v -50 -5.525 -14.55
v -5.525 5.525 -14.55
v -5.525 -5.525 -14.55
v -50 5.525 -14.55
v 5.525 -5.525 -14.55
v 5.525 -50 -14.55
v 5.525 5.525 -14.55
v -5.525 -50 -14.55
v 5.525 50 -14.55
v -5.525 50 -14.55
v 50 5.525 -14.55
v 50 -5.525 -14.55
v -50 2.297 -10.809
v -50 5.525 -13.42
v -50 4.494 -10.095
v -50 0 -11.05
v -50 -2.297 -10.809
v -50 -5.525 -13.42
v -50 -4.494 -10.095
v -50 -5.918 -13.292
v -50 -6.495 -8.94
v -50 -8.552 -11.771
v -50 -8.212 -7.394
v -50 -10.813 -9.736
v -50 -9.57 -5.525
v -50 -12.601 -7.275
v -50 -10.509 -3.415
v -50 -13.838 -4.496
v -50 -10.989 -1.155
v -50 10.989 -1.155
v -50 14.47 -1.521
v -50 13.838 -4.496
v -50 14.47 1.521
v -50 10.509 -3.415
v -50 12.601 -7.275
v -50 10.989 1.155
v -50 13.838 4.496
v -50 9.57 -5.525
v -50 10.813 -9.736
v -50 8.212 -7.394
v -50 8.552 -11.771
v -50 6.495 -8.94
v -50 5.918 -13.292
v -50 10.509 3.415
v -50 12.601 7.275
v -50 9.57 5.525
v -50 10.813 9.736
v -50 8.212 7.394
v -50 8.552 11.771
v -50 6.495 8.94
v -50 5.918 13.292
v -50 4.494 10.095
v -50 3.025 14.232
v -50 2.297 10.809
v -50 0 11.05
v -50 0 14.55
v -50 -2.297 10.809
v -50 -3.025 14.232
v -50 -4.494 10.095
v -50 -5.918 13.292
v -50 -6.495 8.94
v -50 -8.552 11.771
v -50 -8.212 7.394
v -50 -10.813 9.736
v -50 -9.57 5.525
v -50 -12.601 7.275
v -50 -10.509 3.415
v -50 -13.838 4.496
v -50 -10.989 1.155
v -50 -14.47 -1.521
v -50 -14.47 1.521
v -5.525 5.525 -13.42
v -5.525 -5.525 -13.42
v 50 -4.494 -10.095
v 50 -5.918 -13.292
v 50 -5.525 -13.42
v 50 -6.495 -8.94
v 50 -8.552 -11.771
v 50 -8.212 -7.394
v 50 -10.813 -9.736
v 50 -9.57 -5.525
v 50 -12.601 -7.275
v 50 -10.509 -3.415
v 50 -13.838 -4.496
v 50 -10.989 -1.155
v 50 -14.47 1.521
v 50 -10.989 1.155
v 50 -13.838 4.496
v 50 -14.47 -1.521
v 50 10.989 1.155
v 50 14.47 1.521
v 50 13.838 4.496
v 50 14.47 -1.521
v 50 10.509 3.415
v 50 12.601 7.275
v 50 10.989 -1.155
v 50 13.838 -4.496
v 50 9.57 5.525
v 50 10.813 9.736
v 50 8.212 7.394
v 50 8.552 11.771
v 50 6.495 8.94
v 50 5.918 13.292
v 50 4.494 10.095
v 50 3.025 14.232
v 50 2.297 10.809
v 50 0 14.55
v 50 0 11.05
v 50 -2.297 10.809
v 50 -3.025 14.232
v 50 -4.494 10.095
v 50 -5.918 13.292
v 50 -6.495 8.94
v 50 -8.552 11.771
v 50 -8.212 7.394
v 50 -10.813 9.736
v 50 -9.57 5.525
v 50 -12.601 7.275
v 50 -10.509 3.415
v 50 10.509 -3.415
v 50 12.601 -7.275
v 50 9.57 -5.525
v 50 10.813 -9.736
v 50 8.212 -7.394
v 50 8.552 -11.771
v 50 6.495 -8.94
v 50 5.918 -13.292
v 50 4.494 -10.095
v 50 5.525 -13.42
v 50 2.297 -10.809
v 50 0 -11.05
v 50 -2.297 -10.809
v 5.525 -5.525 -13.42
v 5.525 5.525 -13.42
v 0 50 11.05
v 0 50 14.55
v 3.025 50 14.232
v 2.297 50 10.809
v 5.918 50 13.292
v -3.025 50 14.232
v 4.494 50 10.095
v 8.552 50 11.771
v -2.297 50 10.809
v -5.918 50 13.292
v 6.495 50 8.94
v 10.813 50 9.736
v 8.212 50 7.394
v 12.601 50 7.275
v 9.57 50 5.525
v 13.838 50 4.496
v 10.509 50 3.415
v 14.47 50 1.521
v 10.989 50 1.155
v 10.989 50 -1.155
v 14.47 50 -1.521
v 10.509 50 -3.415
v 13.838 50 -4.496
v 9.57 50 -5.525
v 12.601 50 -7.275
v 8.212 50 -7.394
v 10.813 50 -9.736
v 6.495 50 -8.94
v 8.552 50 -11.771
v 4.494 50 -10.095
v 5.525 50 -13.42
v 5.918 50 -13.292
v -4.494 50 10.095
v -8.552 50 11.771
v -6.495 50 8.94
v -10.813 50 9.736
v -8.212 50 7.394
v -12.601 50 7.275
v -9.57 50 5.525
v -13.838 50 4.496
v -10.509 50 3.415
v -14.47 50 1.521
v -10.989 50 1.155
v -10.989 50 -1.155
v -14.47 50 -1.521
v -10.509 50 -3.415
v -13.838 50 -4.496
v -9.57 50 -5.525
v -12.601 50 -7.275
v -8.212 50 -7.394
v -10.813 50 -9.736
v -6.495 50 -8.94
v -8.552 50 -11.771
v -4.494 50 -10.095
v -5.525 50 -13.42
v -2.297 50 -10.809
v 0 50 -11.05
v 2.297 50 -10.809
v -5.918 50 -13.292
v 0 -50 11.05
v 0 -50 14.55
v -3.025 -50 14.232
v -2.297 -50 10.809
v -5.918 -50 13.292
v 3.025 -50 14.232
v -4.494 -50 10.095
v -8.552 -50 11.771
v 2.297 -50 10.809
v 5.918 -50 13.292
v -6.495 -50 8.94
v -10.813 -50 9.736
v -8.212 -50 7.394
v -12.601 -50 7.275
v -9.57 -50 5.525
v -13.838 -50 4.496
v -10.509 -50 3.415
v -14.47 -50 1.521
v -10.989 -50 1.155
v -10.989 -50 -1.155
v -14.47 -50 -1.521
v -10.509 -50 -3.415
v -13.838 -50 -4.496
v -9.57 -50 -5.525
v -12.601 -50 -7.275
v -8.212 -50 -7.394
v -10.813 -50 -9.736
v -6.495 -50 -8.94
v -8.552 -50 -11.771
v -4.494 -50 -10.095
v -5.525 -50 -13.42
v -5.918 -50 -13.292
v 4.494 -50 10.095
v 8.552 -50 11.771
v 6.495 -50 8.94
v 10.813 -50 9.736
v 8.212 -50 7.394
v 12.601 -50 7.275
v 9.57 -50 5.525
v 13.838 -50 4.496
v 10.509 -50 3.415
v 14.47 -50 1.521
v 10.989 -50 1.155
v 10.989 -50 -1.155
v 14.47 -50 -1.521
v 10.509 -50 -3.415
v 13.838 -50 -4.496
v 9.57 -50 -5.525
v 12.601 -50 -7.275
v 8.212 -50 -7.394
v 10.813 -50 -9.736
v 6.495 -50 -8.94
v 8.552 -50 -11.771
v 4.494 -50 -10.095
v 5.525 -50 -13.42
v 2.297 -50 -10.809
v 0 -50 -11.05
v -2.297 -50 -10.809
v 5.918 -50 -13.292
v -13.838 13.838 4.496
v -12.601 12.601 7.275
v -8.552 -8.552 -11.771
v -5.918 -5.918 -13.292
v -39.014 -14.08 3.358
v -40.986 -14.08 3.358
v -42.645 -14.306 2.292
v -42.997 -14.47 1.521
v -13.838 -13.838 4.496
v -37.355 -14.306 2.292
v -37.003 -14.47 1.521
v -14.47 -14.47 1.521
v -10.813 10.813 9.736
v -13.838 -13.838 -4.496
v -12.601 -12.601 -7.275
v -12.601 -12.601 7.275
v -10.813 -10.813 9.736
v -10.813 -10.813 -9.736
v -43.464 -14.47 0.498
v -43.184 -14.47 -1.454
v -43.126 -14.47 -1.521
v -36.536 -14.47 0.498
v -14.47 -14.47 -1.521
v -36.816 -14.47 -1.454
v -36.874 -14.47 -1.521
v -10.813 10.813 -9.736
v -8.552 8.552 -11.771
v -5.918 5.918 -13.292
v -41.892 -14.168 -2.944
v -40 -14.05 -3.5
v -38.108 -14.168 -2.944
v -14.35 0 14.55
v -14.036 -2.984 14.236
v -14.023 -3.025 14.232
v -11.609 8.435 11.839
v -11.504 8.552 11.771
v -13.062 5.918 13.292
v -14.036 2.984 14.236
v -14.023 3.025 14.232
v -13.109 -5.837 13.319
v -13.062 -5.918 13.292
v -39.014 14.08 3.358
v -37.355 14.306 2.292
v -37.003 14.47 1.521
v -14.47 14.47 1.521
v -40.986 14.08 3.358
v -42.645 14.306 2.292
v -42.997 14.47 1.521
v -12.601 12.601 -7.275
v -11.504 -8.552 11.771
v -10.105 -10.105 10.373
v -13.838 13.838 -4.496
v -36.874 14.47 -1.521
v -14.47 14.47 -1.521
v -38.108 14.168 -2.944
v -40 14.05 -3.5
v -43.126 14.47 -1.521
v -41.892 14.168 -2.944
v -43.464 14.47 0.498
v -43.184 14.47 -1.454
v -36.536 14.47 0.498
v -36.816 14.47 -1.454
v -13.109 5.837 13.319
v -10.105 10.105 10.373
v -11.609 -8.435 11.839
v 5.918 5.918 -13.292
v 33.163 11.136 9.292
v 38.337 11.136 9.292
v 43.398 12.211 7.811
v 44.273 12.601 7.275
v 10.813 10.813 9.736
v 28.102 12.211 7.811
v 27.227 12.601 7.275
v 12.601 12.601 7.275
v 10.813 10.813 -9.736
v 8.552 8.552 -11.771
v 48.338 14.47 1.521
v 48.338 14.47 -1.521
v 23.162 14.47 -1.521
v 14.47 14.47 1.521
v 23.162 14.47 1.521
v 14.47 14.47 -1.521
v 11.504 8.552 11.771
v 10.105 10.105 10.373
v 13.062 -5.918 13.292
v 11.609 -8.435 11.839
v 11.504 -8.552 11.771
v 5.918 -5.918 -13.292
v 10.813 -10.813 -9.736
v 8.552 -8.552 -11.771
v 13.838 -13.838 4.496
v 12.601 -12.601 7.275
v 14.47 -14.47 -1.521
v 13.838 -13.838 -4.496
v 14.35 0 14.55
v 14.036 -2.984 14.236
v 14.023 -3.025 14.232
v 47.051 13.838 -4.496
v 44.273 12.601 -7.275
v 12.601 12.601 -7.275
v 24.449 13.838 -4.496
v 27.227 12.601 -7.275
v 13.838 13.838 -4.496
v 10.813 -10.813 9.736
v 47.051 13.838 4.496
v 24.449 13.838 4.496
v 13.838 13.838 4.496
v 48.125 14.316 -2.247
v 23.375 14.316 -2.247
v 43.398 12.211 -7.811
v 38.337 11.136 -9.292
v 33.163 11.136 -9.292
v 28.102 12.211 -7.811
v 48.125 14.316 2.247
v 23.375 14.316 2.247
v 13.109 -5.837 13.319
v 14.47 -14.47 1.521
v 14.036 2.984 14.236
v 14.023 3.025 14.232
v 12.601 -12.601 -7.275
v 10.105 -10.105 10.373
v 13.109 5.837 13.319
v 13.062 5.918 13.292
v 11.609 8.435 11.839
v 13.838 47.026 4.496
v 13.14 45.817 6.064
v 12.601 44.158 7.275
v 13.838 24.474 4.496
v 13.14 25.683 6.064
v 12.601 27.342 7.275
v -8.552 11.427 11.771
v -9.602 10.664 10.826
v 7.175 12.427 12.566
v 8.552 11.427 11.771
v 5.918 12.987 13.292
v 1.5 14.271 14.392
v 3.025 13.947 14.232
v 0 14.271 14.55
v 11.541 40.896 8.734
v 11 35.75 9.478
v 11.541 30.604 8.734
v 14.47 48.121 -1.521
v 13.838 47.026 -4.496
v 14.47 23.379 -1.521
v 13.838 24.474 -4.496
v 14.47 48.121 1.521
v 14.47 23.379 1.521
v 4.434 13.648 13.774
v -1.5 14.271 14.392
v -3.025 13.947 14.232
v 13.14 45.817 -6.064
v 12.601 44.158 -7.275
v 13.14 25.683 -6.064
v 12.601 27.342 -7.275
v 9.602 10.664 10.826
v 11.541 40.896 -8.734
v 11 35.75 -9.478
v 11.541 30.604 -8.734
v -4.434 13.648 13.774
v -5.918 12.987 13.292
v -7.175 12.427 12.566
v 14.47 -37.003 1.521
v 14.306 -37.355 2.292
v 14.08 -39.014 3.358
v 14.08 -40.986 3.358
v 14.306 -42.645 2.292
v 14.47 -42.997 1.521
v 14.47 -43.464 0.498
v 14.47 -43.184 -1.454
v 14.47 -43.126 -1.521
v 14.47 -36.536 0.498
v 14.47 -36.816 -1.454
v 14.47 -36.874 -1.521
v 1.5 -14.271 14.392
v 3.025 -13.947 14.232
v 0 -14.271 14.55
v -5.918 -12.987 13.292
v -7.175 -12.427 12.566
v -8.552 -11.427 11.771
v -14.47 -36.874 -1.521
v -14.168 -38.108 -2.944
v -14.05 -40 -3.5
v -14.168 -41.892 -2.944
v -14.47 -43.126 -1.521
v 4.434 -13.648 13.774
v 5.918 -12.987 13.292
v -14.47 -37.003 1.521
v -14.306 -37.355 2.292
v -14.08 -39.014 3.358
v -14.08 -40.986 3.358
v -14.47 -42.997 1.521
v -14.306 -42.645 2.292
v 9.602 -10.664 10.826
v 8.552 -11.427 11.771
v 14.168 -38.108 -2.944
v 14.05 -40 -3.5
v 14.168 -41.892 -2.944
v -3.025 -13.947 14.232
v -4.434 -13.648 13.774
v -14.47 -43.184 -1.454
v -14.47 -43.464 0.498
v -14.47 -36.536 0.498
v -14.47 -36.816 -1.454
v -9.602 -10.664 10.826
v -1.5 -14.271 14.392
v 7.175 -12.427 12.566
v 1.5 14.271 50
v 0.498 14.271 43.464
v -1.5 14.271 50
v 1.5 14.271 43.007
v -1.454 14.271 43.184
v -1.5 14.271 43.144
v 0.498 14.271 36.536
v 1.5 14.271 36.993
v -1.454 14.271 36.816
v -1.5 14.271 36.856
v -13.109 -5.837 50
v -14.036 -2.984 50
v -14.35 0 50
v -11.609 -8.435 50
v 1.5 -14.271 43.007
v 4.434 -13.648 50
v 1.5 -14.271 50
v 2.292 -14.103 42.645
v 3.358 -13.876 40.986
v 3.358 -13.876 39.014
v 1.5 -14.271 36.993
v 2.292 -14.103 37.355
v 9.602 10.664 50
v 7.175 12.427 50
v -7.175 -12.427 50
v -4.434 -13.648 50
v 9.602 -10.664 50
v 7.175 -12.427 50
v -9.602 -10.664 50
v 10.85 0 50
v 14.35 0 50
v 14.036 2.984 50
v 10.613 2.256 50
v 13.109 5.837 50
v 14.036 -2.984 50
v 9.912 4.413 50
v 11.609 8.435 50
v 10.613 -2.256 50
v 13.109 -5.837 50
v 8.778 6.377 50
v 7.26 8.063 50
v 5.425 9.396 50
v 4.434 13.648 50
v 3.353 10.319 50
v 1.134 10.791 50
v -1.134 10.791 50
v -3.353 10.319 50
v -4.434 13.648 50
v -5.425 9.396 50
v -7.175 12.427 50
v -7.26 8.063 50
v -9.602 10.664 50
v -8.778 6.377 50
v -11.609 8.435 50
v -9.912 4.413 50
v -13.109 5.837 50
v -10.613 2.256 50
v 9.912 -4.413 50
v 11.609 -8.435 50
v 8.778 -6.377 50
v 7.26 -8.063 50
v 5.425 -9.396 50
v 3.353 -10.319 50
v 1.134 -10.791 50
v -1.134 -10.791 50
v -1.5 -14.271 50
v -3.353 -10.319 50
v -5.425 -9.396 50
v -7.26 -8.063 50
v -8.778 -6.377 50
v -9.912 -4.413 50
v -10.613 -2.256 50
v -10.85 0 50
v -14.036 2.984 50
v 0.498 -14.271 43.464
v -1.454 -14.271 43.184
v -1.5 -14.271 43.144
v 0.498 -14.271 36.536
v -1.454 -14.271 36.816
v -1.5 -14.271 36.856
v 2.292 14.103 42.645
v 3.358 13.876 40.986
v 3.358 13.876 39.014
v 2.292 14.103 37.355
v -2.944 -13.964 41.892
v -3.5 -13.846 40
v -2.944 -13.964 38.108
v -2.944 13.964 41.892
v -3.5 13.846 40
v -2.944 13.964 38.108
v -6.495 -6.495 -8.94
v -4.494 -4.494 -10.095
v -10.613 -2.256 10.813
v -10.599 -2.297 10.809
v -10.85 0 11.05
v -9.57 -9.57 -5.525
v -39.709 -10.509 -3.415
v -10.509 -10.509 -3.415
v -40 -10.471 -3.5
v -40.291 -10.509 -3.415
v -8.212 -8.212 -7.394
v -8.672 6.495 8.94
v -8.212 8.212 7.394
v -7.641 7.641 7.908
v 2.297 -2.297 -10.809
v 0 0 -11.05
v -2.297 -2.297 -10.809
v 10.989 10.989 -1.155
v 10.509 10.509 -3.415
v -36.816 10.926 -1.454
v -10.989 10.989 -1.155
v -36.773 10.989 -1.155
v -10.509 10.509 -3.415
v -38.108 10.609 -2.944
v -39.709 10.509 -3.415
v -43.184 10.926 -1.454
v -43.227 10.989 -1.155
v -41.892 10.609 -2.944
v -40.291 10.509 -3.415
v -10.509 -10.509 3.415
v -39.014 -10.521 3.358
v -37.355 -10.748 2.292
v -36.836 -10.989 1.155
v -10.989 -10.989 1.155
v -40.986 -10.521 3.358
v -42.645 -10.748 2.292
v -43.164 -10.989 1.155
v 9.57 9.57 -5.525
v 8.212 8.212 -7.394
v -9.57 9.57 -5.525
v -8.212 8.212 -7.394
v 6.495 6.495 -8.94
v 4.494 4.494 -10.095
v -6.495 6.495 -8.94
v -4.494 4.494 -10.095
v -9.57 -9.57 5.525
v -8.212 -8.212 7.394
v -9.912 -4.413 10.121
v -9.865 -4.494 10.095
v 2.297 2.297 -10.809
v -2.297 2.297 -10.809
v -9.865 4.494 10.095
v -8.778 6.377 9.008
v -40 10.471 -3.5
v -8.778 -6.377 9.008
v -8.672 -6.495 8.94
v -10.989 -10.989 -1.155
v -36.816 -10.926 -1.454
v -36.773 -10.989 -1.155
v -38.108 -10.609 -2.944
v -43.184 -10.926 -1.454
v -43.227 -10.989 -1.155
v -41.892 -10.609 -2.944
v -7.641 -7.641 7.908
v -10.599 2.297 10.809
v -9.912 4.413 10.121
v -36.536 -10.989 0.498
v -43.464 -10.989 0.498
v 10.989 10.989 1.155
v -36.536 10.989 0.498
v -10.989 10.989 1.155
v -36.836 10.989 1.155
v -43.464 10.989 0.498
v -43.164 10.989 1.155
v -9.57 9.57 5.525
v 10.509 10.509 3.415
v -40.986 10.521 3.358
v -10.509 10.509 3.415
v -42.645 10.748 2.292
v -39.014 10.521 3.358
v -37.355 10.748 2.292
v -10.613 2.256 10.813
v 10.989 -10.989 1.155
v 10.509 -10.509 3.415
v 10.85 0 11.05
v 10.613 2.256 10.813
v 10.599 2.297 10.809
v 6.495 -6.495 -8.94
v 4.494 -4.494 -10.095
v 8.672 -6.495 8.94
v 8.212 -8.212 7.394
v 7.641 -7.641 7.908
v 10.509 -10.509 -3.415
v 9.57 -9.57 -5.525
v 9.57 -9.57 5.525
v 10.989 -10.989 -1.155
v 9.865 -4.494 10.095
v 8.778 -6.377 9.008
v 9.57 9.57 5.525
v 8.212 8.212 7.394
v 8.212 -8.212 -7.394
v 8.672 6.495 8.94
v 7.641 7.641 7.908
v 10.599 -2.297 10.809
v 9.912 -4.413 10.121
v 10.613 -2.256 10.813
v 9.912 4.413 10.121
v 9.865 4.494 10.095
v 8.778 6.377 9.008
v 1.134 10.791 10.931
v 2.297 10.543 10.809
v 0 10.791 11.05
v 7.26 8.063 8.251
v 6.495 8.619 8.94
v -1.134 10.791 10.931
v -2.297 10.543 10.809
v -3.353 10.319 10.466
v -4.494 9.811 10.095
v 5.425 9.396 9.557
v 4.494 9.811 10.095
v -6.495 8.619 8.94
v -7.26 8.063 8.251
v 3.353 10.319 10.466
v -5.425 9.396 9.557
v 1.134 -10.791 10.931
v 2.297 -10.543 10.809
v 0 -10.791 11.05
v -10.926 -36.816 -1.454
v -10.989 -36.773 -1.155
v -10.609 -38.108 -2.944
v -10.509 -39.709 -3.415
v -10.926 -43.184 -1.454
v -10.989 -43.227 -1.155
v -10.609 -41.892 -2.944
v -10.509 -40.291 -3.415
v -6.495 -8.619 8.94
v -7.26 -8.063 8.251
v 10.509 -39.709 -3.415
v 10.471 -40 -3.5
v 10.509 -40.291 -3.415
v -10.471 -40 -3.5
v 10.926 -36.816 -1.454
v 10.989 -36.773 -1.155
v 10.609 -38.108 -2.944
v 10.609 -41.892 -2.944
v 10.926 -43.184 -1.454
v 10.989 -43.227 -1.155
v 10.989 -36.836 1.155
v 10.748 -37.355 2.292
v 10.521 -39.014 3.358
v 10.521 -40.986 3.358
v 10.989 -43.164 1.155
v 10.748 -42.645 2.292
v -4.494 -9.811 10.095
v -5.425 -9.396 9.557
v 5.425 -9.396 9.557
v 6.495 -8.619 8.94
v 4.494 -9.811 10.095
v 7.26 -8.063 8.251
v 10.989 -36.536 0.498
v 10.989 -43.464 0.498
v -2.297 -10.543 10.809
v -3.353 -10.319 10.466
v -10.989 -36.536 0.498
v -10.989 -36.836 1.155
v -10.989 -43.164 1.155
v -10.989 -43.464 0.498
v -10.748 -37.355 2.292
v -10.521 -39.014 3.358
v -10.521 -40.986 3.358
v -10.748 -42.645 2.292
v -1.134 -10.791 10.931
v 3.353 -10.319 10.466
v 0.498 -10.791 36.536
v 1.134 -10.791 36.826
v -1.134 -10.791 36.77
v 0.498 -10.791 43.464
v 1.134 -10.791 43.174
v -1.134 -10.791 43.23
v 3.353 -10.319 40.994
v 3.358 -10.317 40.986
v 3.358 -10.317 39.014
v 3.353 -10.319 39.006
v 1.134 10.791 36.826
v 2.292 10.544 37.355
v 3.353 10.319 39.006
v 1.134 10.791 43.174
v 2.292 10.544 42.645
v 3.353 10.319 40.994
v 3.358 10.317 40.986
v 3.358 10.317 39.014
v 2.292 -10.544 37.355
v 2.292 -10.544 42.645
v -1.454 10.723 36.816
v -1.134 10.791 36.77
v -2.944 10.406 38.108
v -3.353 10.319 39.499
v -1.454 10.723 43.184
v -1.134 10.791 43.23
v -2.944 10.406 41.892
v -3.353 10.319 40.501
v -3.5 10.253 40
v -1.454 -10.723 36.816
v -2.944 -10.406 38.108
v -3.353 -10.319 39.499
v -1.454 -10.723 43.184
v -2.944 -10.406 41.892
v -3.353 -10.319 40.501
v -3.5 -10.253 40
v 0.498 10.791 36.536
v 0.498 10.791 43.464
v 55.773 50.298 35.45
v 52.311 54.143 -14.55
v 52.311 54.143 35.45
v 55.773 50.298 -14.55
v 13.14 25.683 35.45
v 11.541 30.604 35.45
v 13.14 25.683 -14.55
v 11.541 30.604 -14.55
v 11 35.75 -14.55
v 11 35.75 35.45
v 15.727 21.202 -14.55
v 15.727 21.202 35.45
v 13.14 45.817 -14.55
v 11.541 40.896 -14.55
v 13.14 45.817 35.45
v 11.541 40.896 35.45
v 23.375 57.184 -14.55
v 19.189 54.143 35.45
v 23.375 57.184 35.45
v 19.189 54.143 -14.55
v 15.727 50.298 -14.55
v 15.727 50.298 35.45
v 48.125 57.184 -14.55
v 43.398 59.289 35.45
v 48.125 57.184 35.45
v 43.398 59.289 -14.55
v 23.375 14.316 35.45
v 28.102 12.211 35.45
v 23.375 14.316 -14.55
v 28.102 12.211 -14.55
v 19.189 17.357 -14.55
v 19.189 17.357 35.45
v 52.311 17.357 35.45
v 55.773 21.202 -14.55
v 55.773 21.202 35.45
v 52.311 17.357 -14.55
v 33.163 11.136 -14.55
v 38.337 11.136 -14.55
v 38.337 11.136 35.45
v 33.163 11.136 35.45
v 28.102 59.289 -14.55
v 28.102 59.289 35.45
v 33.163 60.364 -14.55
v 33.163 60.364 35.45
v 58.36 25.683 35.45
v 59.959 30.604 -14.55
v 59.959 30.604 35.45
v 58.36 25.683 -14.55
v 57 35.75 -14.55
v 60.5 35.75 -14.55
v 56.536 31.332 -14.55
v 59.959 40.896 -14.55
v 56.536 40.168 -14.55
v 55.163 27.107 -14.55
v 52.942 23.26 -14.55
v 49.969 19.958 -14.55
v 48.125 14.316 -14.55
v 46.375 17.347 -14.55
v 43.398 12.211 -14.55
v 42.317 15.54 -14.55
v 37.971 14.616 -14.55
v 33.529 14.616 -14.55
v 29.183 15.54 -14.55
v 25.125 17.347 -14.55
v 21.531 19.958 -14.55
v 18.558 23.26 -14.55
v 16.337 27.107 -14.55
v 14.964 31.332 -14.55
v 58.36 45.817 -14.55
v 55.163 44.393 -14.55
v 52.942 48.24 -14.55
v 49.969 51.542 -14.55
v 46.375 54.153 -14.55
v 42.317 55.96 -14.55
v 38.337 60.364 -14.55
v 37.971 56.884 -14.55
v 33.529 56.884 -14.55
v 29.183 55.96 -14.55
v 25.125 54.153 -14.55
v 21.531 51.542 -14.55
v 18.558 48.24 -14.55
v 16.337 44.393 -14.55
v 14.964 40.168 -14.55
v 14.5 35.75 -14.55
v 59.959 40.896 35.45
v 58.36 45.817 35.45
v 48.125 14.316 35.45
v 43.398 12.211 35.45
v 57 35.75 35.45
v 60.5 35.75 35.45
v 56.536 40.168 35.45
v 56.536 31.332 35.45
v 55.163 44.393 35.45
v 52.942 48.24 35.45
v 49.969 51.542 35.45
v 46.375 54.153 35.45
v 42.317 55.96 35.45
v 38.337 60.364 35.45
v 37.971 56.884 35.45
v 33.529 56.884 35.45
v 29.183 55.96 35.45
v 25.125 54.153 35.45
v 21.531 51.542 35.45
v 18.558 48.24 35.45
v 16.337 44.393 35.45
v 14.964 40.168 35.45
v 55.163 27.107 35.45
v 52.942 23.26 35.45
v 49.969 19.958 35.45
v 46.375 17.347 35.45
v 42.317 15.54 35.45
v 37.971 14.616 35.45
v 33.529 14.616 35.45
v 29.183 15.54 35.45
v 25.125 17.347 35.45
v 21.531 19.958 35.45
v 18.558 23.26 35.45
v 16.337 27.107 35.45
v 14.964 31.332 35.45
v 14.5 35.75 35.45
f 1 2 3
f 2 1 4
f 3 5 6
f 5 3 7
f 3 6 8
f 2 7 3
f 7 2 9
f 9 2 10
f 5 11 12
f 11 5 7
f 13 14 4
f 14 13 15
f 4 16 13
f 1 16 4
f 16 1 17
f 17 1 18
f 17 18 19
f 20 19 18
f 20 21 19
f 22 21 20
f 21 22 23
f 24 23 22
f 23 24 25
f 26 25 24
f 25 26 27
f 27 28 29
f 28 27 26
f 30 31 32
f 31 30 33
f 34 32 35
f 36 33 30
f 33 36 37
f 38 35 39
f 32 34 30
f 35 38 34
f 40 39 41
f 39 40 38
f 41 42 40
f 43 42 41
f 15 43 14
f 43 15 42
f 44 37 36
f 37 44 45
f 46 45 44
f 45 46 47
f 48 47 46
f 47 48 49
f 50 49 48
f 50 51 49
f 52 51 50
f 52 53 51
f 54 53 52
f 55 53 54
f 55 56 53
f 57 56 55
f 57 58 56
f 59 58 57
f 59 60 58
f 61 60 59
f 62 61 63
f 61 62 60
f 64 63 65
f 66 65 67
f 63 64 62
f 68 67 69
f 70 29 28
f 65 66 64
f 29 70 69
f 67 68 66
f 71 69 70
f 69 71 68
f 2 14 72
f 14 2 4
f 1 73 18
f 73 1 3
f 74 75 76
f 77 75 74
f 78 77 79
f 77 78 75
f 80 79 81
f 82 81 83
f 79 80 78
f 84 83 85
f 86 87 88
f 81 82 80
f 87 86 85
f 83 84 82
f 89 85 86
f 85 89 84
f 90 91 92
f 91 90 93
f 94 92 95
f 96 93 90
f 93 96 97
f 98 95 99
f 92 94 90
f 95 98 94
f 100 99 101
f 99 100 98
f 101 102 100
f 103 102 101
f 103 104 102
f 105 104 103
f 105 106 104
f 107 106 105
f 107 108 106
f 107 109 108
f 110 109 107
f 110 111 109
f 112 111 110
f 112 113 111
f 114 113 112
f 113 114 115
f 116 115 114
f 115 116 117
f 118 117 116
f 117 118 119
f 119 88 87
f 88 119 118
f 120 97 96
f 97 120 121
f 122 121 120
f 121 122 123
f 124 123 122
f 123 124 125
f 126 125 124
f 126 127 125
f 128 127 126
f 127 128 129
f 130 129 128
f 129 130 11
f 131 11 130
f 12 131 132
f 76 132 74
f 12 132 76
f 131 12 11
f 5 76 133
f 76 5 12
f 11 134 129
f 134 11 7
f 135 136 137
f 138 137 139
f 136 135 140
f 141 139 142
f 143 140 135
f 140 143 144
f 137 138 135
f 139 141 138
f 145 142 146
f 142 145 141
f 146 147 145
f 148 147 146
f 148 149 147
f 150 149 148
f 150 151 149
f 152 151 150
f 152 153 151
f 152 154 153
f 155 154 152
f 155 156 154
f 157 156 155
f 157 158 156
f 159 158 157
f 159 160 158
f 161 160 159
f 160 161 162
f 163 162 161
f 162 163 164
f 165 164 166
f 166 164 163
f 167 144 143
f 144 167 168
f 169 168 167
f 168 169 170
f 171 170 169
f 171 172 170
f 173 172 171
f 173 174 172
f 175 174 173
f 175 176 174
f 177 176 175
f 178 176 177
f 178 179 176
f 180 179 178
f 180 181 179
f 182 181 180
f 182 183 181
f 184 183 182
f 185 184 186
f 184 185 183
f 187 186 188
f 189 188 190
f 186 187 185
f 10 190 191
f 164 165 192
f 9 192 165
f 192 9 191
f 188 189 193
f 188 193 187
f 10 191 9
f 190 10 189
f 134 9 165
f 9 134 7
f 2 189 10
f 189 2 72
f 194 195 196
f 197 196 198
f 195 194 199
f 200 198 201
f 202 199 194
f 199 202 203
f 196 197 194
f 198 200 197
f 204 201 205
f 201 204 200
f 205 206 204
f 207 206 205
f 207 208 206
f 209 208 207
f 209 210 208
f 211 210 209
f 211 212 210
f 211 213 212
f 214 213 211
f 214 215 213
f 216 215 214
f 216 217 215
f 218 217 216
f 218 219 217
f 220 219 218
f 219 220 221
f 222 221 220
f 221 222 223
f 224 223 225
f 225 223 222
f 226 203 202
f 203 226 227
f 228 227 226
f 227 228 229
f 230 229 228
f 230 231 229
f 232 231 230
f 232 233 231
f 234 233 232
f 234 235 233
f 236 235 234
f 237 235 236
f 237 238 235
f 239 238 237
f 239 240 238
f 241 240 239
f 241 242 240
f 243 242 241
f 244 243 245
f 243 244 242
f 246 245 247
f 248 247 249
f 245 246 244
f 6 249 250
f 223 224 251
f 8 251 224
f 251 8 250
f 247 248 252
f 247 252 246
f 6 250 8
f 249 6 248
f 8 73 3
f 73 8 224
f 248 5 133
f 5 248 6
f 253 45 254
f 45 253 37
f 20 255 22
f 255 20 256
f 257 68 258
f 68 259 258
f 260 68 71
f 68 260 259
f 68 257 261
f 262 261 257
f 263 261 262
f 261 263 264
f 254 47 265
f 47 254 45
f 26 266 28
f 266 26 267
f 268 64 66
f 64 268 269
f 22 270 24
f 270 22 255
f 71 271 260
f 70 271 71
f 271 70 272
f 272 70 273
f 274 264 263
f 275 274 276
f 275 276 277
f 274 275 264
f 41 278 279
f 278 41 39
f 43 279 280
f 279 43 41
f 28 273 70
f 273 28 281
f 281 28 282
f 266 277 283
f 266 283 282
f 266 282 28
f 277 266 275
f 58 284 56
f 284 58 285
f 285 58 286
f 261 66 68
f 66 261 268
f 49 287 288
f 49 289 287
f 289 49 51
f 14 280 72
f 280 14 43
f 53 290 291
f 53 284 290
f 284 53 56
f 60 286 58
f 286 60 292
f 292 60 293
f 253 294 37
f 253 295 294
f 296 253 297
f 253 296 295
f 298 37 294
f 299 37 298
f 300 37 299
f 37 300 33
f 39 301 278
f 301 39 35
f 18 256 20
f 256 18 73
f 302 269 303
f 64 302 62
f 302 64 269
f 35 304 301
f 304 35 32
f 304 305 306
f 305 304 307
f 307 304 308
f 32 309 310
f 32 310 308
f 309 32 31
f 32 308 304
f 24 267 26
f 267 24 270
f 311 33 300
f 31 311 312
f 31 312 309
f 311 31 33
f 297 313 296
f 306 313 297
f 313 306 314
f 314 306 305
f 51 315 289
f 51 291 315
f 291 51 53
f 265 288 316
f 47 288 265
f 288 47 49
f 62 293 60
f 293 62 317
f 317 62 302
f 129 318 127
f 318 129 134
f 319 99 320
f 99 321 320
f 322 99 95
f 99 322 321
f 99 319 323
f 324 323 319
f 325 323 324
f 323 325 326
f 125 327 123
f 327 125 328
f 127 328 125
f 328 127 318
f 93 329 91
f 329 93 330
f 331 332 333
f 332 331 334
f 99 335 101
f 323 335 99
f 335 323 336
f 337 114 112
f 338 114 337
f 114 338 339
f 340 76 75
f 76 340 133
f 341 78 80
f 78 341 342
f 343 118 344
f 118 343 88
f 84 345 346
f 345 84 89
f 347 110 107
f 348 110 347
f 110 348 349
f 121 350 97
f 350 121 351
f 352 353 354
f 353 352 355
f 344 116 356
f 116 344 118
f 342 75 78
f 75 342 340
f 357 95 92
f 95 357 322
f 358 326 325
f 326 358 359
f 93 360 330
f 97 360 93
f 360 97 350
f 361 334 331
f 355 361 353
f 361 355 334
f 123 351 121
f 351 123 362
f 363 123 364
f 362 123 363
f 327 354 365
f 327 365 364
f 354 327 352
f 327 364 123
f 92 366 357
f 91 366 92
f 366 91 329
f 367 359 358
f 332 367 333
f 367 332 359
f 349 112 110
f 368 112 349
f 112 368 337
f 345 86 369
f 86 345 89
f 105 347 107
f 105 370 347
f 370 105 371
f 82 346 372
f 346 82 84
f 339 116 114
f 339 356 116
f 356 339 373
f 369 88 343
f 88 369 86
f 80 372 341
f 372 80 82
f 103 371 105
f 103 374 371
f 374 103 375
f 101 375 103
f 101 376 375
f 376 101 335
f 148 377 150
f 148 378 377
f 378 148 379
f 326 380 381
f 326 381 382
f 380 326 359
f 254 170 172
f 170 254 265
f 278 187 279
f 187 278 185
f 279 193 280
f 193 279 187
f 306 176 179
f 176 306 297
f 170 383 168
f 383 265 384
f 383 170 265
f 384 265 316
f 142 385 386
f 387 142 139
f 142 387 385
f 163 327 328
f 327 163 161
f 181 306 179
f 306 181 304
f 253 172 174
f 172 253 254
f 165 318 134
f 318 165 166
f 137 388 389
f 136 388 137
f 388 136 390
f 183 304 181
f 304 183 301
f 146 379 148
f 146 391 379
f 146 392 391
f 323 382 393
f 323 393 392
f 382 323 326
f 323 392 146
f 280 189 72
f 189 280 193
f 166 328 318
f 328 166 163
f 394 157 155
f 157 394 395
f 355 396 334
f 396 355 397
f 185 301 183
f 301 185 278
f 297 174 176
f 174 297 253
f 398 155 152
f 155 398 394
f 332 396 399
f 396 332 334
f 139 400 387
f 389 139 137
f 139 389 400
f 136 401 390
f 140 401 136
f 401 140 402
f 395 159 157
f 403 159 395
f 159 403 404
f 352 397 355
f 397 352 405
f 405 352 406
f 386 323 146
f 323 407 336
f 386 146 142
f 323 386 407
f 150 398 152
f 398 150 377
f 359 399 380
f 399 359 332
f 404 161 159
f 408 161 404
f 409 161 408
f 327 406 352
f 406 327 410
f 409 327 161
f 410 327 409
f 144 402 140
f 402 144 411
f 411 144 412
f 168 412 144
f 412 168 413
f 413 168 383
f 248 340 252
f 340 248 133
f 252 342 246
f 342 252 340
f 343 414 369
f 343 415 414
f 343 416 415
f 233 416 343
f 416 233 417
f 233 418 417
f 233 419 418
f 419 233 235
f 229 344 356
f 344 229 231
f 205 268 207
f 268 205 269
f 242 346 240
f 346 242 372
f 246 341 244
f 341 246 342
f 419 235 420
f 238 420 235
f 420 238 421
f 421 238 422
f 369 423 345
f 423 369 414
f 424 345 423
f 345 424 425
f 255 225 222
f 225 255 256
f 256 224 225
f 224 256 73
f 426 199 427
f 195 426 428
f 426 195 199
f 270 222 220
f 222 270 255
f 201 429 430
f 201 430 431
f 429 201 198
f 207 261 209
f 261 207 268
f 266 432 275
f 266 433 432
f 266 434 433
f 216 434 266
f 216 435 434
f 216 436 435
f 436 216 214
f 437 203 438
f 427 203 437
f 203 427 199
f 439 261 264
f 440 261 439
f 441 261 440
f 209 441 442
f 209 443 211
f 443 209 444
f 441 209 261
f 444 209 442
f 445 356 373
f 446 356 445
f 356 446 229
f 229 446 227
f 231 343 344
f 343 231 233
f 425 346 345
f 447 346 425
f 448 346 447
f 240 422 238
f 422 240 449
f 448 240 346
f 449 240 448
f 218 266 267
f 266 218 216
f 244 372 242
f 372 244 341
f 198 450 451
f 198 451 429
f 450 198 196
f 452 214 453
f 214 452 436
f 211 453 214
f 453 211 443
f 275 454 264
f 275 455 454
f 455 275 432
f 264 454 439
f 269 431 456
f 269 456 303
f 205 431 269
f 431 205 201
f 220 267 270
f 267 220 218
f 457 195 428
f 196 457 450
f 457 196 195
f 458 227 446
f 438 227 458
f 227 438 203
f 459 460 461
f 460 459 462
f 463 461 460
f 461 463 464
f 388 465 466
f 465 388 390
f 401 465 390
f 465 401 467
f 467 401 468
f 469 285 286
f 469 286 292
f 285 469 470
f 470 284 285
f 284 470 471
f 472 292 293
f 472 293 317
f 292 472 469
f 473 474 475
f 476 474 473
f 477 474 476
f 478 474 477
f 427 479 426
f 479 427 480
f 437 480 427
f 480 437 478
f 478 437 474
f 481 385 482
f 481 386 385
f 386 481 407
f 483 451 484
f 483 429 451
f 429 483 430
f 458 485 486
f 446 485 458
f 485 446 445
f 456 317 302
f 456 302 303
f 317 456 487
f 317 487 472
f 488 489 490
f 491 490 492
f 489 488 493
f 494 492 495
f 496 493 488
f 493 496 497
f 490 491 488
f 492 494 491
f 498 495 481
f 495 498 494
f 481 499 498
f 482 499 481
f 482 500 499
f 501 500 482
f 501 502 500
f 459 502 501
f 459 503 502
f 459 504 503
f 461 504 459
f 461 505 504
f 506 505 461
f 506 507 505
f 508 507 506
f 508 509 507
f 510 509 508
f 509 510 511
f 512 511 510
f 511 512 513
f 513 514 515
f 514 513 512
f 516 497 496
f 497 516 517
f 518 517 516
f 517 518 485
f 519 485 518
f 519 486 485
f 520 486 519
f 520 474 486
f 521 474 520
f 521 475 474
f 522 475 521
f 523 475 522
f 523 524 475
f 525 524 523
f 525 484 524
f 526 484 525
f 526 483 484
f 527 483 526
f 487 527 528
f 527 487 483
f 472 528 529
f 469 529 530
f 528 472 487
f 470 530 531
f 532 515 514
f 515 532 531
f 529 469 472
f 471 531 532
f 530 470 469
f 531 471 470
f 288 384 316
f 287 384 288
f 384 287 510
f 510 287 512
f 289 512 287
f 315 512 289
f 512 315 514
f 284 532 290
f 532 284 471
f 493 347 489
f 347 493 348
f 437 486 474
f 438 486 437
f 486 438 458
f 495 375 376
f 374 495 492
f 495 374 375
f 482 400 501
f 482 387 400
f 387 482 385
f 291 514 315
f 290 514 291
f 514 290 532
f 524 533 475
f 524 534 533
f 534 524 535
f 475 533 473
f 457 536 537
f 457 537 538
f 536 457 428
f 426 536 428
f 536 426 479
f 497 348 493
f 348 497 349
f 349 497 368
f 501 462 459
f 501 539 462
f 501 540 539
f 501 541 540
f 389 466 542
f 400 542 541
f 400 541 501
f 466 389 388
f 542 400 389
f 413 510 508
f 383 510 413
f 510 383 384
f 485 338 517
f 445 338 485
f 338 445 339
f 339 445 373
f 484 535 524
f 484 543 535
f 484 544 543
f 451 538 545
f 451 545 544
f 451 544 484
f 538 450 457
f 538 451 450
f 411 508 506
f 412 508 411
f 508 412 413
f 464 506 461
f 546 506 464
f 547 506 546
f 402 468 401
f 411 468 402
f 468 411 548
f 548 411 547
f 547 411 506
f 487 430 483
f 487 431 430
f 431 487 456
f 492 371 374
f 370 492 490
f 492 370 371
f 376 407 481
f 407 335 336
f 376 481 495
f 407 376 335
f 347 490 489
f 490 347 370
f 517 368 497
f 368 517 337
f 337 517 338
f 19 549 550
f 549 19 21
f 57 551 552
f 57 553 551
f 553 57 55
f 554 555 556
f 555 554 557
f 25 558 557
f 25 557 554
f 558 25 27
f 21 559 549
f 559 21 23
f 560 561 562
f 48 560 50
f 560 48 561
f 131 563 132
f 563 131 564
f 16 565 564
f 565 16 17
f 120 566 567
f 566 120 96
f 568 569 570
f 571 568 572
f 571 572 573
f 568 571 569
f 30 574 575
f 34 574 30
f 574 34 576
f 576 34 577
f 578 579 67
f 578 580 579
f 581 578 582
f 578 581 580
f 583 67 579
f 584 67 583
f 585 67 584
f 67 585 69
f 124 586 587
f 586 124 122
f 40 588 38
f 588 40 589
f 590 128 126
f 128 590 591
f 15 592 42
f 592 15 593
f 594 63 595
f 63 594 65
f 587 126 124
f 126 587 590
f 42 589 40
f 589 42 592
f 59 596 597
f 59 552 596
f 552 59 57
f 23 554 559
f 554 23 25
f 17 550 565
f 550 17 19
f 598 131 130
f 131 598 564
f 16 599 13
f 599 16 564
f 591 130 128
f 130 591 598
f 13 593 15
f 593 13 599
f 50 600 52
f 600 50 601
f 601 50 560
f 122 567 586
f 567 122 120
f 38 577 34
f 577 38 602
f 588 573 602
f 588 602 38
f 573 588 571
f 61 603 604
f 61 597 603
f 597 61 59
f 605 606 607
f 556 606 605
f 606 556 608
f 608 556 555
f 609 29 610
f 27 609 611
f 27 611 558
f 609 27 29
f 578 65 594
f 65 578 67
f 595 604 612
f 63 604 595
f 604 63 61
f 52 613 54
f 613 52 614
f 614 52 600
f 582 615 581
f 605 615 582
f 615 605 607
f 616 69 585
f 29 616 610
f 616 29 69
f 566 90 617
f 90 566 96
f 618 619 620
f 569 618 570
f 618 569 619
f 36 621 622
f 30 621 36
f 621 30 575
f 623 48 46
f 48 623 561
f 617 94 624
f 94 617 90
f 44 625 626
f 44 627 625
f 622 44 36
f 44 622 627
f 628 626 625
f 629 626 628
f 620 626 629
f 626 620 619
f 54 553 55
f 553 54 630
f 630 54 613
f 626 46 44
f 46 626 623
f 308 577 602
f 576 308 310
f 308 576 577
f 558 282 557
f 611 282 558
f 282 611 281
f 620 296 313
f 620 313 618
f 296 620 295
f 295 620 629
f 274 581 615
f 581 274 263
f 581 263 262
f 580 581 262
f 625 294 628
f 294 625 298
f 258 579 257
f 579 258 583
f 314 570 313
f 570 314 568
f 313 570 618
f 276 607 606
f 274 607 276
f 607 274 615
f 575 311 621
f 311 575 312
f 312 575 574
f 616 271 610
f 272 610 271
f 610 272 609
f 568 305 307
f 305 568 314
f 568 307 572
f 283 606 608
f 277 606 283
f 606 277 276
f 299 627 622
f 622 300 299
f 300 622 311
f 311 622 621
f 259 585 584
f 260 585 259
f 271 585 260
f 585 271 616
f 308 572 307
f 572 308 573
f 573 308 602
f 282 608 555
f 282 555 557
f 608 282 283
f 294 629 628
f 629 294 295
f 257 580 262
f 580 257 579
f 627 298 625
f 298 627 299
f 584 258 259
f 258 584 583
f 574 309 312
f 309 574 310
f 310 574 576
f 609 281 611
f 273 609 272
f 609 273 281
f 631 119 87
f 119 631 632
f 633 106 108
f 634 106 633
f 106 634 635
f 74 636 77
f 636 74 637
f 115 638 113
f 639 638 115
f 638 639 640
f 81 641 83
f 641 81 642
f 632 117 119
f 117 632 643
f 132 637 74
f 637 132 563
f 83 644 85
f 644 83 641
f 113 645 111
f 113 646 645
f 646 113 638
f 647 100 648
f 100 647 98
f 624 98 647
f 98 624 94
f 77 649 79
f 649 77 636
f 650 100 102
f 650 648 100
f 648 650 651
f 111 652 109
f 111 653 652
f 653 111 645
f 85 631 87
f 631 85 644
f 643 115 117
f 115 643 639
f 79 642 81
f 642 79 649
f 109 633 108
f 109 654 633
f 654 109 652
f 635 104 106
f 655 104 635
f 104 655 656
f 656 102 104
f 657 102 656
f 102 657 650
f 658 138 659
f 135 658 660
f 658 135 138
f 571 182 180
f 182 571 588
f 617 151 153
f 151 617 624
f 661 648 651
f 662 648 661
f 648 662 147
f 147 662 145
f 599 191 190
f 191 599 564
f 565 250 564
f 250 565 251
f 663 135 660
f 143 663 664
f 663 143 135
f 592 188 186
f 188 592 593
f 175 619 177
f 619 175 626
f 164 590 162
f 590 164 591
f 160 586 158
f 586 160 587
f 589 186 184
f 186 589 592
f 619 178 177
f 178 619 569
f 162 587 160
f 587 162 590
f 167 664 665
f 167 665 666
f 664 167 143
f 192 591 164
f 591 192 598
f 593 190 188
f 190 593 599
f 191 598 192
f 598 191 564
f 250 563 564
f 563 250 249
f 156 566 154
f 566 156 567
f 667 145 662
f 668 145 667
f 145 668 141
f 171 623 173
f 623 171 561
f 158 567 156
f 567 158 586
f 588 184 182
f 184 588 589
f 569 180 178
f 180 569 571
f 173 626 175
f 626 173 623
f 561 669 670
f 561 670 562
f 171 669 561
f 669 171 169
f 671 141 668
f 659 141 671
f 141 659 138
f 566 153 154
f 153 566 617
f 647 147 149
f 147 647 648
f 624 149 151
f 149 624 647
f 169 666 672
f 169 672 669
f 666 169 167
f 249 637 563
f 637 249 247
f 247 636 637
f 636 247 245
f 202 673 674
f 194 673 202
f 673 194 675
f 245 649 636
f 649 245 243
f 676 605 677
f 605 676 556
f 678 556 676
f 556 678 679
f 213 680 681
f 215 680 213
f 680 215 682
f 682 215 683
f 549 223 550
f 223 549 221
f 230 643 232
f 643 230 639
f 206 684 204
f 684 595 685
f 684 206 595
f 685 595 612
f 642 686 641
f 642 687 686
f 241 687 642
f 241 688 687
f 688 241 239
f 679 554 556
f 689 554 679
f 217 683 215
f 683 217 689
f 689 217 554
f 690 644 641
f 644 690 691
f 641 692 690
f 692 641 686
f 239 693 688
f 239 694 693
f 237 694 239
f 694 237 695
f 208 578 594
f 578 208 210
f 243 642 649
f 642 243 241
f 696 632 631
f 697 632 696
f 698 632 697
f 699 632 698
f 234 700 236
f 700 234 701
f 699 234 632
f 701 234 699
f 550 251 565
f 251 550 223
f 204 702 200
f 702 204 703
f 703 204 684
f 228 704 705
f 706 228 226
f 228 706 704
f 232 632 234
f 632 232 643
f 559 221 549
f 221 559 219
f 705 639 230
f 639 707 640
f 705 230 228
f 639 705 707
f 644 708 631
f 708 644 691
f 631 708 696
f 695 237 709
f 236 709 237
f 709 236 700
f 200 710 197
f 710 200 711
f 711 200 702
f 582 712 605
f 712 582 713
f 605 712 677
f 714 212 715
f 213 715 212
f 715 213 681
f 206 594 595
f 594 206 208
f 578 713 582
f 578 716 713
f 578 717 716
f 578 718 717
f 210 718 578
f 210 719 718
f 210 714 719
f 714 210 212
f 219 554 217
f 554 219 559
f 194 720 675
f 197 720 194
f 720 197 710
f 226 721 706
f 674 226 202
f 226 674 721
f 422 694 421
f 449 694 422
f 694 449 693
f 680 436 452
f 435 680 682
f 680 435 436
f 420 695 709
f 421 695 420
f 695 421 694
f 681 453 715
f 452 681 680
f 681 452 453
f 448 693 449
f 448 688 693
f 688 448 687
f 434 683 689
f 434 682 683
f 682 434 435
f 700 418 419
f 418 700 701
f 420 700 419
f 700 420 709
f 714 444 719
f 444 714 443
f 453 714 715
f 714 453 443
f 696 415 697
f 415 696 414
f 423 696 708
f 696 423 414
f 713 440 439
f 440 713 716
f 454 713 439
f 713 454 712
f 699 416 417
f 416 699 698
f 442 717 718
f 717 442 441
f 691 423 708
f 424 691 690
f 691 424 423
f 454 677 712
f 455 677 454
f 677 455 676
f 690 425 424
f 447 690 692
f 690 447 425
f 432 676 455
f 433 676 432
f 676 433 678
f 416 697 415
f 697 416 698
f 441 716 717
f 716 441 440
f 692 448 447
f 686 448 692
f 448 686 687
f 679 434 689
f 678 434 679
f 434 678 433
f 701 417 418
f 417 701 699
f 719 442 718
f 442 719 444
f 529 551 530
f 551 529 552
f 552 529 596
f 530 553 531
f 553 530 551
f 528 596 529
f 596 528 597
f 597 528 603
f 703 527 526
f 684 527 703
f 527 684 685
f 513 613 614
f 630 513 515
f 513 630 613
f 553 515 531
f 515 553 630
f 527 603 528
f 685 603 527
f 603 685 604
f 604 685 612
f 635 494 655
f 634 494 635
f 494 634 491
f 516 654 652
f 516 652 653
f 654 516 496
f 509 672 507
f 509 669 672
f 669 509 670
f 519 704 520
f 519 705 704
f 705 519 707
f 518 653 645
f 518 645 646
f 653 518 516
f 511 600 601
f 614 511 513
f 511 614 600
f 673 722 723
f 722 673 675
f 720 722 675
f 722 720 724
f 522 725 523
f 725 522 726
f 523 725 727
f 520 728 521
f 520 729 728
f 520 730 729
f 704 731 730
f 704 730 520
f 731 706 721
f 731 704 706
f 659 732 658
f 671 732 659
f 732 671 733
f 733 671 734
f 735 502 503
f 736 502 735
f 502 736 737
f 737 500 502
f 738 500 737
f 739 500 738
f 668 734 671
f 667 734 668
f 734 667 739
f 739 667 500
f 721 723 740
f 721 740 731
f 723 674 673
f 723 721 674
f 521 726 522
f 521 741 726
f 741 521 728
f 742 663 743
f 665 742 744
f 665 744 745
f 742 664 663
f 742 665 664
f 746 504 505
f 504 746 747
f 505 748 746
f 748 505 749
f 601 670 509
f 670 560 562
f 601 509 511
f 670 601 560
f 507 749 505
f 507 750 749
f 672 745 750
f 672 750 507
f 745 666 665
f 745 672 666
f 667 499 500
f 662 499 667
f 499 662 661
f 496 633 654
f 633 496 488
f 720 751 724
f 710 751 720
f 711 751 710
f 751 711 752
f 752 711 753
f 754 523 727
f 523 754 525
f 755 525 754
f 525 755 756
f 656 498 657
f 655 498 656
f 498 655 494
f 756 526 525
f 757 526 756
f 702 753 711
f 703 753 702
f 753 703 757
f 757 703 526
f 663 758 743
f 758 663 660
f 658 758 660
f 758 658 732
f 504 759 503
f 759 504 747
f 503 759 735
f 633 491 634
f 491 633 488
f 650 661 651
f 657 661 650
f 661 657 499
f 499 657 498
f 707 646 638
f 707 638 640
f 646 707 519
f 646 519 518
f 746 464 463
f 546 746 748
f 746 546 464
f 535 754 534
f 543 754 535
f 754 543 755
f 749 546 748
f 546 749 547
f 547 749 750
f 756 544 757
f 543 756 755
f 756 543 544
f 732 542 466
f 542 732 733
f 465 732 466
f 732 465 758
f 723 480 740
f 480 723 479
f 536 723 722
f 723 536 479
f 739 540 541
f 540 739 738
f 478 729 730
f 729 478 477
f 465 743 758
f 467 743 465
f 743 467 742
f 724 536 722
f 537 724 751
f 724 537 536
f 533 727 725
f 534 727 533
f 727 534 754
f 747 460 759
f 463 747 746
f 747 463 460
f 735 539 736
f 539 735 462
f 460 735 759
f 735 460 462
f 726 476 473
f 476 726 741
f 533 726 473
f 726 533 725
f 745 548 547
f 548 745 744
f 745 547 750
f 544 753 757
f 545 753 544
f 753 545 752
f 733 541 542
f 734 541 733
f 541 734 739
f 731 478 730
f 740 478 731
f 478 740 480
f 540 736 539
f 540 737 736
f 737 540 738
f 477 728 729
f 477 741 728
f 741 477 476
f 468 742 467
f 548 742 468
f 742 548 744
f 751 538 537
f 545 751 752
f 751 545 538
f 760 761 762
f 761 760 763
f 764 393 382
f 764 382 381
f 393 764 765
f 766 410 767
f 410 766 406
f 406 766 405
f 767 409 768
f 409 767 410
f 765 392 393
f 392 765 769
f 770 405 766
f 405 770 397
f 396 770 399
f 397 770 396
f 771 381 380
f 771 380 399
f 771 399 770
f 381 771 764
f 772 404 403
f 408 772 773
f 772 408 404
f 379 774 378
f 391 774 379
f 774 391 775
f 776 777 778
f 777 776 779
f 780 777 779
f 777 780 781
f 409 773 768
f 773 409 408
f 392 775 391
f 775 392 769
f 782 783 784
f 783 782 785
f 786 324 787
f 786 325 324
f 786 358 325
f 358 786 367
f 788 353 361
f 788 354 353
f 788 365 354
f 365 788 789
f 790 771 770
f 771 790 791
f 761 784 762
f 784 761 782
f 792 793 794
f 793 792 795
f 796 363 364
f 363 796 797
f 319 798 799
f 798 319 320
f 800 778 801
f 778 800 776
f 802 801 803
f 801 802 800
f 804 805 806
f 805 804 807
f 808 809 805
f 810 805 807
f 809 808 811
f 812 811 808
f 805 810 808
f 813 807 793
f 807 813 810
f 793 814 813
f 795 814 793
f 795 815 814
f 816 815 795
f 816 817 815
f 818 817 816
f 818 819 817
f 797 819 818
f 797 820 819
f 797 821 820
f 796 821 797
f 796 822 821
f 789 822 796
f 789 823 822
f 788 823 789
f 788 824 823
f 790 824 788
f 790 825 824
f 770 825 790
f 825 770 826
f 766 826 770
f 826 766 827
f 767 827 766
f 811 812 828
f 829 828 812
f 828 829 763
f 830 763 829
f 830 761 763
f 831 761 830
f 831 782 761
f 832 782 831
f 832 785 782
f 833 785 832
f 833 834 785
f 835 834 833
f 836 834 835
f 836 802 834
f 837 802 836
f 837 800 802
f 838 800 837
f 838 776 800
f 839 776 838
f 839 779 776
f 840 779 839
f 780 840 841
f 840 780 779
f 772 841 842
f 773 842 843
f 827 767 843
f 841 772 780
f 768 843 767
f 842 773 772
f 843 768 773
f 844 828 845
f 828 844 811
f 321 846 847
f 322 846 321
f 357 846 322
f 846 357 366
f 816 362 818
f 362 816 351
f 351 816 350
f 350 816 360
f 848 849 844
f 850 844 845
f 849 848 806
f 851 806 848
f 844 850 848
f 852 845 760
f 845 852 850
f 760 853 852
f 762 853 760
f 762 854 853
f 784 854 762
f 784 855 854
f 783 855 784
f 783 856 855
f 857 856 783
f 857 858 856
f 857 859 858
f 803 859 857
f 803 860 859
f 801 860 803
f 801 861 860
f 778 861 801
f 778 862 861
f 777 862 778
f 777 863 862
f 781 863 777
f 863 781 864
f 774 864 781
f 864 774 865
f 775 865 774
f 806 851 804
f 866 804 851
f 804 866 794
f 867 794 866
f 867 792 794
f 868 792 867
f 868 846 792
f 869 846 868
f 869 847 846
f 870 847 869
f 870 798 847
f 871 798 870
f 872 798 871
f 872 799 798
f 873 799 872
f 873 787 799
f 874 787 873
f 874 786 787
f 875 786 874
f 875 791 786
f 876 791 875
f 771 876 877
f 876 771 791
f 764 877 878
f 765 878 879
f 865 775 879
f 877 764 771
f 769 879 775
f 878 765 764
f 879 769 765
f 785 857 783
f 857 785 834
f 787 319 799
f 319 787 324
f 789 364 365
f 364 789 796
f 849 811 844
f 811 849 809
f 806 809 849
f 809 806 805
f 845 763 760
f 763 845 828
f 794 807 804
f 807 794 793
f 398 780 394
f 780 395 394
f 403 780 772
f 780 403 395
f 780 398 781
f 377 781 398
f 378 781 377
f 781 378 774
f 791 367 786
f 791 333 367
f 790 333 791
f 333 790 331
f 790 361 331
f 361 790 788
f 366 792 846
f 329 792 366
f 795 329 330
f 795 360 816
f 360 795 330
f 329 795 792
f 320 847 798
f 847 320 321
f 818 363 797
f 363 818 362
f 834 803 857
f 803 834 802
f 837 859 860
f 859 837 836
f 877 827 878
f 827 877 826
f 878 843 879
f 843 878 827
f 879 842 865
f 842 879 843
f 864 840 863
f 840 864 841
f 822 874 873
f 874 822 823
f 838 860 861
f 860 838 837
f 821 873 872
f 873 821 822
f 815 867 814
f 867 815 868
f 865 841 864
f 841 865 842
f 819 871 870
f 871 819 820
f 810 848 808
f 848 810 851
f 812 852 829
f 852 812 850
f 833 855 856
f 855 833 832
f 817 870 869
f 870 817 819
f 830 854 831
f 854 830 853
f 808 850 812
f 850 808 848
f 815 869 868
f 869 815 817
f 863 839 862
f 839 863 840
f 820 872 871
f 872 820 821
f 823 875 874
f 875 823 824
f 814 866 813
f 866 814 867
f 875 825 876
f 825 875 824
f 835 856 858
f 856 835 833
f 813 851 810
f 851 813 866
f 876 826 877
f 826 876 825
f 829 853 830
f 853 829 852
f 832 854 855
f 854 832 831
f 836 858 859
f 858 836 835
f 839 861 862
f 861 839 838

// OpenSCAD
// file: jointModule.scad
// Modules
// legs is a vector of legs,
// each leg is a vector containing:
// vector of the joint rotation
// horizontalPipeInsideDiameter
// Optional Boolean requesting addition of a flat bottom
// Optional Boolean or number requesting a hole drilled near the end,
//      If it is a number, this is the angle at which it should be drilled.
//      For historical reasons, 0 and true are equivalent
//      Use false when you need to skip this but still add another vector entry
// i.e. [[x, y, z], horizontalPipeInsideDiameter]

/*
i.e.
jointLegs = [
        [[0, 90, 0], horizontalPipeInsideDiameter, true, true],
        [[90, 90, 0], horizontalPipeInsideDiameter, true, 45],
        [[90, 90, 180], horizontalPipeInsideDiameter, true, 90],
    ];

 */
module joint(legs, sphereJointInsideDiameter, closeUpWithSphere)
{
    difference()
        {
            // Build
            union() color(JointColor)
                {
                    for (leg = legs) {
                        rotate(leg[0]) cylinder(
                        h = jointLegLength,
                        r = (leg[1] + jointWallThickness * 2) / 2);
                        // Add flat bottom
                        if (leg[2]) {
                            rotate(leg[0])
                                translate([
                                        (leg[1] / 2) + (jointWallThickness / 2),
                                    0,
                                        jointLegLength / 2
                                    ])
                                    cube([
                                        jointWallThickness,
                                        // The 0.4 is a guess at width. A parameter would probably be better.
                                            leg[1] * 0.5,
                                        jointLegLength
                                        ],
                                    center = true);
                            // Add a cylinder at the end of the leg to close any gap between leg flats
                            // This also creates a solid floor in case the sphere is so big
                            // that the cut below cuts off the bottom of it.
                            rotate(leg[0])
                                rotate([0, 90, 0])
                                    translate([
                                        0,
                                        0,
                                            leg[1] / 2,
                                        ])
                                        cylinder(h = jointWallThickness, r = (leg[1] * 0.5) / 2);
                        }
                    }

                    if (closeUpWithSphere)
                    // Use a Sphere to close up the gap between the pipes.
                    // This is kinda hacky, but it looks good to me and does the job.
                        sphere(d = sphereJointInsideDiameter + jointWallThickness * 2);

                }

            // Hollow out
            union()
                {
                    for (leg = legs) {
                        // The -0.01 ensures that the end of the tube is clear.
                        rotate(leg[0]) translate([0, 0, - 0.01]) cylinder(
                        h = jointLegLength + 0.02, r = leg[1] / 2);

                        // IF a flat bottom was added, also add a "cut" to ensure nothing
                        // else in the part extends below this flat bottom.
                        if (leg[2]) {
                            rotate(leg[0])
                                translate([
                                        (leg[1] / 2) + (jointWallThickness * 2),
                                    0,
                                        jointLegLength / 2
                                    ])
                                    cube([
                                        // The 0.00001 just ensures it doesn't clip the flat on the legs at all.
                                                jointWallThickness * 2 - 0.00001,
                                            leg[1] * 2,
                                            jointLegLength * 2
                                        ],
                                    center = true);
                        }
                        if (len(leg) > 3 && leg[3] != false) {
                            // Make a hole near the end of the leg for pinning
                            echo("Drilling Pinhole");
                            // The -0.01 ensures that the end of the tube is clear.
                            rotate([leg[0][0] + 90, leg[0][1], leg[0][2]]) translate([0,
                                    jointLegLength - 10, 0]) rotate([0, leg[3] == true ? 0 : leg[3], 0]) cylinder(
                            h = jointLegLength + 0.02, d = jointPinningHoleDiameter, center = true);
                        }
                    }

                    if (closeUpWithSphere) {
                        // Hollow out the sphere
                        sphere(d = sphereJointInsideDiameter);
                    }

                }
        }
}
// file: commonParameters.scad
// All measurements in millimeters

// "horizontal" and "vertical" refer to how they are printed on the print bed,
// not how they work on the final assembly.
// ALWAYS print verticle pipes straight up if possible, that is 90 degrees from the bed.
// Attempting to print a slanted pipe will be troublesome and require testing for a proper size.
// However, you can print ANY angle ON the bed.

// 1.25" PVC Pipe:
horizontalPipeInsideDiameter_1_25pvc = 42.9;
verticalPipeInsideDiameter_1_25pvc = 42.5;

// 0.5" PVC Pipe:
horizontalPipeInsideDiameter_0_50pvc = 22.1;
verticalPipeInsideDiameter_0_50pvc = 21.7;

// Parameters
jointLegLength = 50;
jointWallThickness = 3.5;
jointPinningHoleDiameter = 7;
jointPinHoleOffset = 10;

// Walker Foot Parameters
inchesToMmConversionFactor = 25.4;

// Current idea is 11 x 21 inches.
walkerFootHeight = 11 * inchesToMmConversionFactor;
walkerFootLength = 21 * inchesToMmConversionFactor;
// Back of Foot is 1 inches longer to cause foot to hang as desired
walkerFootCenterOffset = 1 * inchesToMmConversionFactor;
walkerFootFrontLength = (walkerFootLength / 2) - (walkerFootCenterOffset / 2);
walkerFootBackLength = (walkerFootLength / 2) + (walkerFootCenterOffset / 2);

footLowerJointLegLength = 75;

// Angles
// This site is great for visualizing what you want: https://www.blocklayer.com/trig/scaleneeng.aspx
// Use this site to check your math and results: https://www.calculator.net/right-triangle-calculator.html
echo("=======================================================");
echo("Walker Foot Parameters");
echo("walkerFootLength", walkerFootLength, walkerFootFrontLength + walkerFootBackLength);
echo("=======================================================");
echo("Front:");
echo("walkerFootHeight (a)", walkerFootHeight);
echo("walkerFootFrontLength (b)", walkerFootFrontLength);
walkerFootFrontTriangleTopLength = sqrt(pow(walkerFootHeight, 2) + pow(walkerFootFrontLength, 2));
echo("walkerFootFrontTriangleTopLength (c)", walkerFootFrontTriangleTopLength);
walkerFootFrontJointAngle = asin(walkerFootHeight / walkerFootFrontTriangleTopLength);
echo("walkerFootFrontJointAngle (α):", walkerFootFrontJointAngle);
walkerAnkleFrontAngle = asin(walkerFootFrontLength / walkerFootFrontTriangleTopLength);
echo("walkerAnkleFrontAngle (β)", walkerAnkleFrontAngle);
echo("-------------------------------------------------------");
echo("Back");
echo("walkerFootBackLength (b)", walkerFootBackLength);
walkerFootBackTriangleTopLength = sqrt(pow(walkerFootHeight, 2) + pow(walkerFootBackLength, 2));
echo("walkerFootBackTriangleTopLength (c)", walkerFootBackTriangleTopLength);
walkerFootBackJointAngle = asin(walkerFootHeight / walkerFootBackTriangleTopLength);
echo("walkerFootBackJointAngle (α):", walkerFootBackJointAngle);
walkerAnkleBackAngle = asin(walkerFootBackLength / walkerFootBackTriangleTopLength);
echo("walkerAnkleBackAngle (β)", walkerAnkleBackAngle);
echo("=======================================================");

// Colors
JointColor = "CornflowerBlue";
PipeColor = "Pink";

// Resoution
// This is perfect for 3D Printing,
// but you may want to comment it out while working to improve preview
// performance
//$fa = 1;
//$fs = 0.4;
// Although this makes it VERY high rez, which might be better for the slicer? Experimenting with it instead.
// NOTE that using $fn causes FreeCAD and hence .step files exported to Fusion 360 to show round items as a series of faces instead of a single object.
//$fn = 500;
// main file
// Load in some defaults
include <commonParameters.scad>;

shaftPipeInsideDiameter = verticalPipeInsideDiameter_1_25pvc;

horizontalPipeInsideDiameter = horizontalPipeInsideDiameter_0_50pvc;
verticalPipeInsideDiameter = verticalPipeInsideDiameter_0_50pvc;

include <jointModule.scad>;

module shaftT()
{
    jointLegs = [
            [[0, 90, 0], horizontalPipeInsideDiameter, true, true],
            [[180, 90, 0], horizontalPipeInsideDiameter, true],
            [[90, 90, 0], horizontalPipeInsideDiameter, true],
            [[270, 90, 0], horizontalPipeInsideDiameter, true, true],
        // Motor Holder
            [[0, 0, 0], verticalPipeInsideDiameter, false, true],
        ];

    rotate([0, 0, 180]) joint(jointLegs, verticalPipeInsideDiameter);
}

shaftT();

// Create offset shaft holder

shaftHolder = [
        [[0, 0, 0], shaftPipeInsideDiameter],
    ];

// The + 0.15 was selected via trial and error to ensure the shaft holder and leg pipes
// don't cross into each other at all.
shaftOffset = (verticalPipeInsideDiameter / 2) + (shaftPipeInsideDiameter / 2) + (jointWallThickness + 0.15);

// Double Wall Thickness to account for flat bottom
translate([shaftOffset, shaftOffset, - (
    horizontalPipeInsideDiameter + (jointWallThickness * 2)) / 2])
    rotate([0, 0, 180]) joint(shaftHolder, shaftPipeInsideDiameter);
